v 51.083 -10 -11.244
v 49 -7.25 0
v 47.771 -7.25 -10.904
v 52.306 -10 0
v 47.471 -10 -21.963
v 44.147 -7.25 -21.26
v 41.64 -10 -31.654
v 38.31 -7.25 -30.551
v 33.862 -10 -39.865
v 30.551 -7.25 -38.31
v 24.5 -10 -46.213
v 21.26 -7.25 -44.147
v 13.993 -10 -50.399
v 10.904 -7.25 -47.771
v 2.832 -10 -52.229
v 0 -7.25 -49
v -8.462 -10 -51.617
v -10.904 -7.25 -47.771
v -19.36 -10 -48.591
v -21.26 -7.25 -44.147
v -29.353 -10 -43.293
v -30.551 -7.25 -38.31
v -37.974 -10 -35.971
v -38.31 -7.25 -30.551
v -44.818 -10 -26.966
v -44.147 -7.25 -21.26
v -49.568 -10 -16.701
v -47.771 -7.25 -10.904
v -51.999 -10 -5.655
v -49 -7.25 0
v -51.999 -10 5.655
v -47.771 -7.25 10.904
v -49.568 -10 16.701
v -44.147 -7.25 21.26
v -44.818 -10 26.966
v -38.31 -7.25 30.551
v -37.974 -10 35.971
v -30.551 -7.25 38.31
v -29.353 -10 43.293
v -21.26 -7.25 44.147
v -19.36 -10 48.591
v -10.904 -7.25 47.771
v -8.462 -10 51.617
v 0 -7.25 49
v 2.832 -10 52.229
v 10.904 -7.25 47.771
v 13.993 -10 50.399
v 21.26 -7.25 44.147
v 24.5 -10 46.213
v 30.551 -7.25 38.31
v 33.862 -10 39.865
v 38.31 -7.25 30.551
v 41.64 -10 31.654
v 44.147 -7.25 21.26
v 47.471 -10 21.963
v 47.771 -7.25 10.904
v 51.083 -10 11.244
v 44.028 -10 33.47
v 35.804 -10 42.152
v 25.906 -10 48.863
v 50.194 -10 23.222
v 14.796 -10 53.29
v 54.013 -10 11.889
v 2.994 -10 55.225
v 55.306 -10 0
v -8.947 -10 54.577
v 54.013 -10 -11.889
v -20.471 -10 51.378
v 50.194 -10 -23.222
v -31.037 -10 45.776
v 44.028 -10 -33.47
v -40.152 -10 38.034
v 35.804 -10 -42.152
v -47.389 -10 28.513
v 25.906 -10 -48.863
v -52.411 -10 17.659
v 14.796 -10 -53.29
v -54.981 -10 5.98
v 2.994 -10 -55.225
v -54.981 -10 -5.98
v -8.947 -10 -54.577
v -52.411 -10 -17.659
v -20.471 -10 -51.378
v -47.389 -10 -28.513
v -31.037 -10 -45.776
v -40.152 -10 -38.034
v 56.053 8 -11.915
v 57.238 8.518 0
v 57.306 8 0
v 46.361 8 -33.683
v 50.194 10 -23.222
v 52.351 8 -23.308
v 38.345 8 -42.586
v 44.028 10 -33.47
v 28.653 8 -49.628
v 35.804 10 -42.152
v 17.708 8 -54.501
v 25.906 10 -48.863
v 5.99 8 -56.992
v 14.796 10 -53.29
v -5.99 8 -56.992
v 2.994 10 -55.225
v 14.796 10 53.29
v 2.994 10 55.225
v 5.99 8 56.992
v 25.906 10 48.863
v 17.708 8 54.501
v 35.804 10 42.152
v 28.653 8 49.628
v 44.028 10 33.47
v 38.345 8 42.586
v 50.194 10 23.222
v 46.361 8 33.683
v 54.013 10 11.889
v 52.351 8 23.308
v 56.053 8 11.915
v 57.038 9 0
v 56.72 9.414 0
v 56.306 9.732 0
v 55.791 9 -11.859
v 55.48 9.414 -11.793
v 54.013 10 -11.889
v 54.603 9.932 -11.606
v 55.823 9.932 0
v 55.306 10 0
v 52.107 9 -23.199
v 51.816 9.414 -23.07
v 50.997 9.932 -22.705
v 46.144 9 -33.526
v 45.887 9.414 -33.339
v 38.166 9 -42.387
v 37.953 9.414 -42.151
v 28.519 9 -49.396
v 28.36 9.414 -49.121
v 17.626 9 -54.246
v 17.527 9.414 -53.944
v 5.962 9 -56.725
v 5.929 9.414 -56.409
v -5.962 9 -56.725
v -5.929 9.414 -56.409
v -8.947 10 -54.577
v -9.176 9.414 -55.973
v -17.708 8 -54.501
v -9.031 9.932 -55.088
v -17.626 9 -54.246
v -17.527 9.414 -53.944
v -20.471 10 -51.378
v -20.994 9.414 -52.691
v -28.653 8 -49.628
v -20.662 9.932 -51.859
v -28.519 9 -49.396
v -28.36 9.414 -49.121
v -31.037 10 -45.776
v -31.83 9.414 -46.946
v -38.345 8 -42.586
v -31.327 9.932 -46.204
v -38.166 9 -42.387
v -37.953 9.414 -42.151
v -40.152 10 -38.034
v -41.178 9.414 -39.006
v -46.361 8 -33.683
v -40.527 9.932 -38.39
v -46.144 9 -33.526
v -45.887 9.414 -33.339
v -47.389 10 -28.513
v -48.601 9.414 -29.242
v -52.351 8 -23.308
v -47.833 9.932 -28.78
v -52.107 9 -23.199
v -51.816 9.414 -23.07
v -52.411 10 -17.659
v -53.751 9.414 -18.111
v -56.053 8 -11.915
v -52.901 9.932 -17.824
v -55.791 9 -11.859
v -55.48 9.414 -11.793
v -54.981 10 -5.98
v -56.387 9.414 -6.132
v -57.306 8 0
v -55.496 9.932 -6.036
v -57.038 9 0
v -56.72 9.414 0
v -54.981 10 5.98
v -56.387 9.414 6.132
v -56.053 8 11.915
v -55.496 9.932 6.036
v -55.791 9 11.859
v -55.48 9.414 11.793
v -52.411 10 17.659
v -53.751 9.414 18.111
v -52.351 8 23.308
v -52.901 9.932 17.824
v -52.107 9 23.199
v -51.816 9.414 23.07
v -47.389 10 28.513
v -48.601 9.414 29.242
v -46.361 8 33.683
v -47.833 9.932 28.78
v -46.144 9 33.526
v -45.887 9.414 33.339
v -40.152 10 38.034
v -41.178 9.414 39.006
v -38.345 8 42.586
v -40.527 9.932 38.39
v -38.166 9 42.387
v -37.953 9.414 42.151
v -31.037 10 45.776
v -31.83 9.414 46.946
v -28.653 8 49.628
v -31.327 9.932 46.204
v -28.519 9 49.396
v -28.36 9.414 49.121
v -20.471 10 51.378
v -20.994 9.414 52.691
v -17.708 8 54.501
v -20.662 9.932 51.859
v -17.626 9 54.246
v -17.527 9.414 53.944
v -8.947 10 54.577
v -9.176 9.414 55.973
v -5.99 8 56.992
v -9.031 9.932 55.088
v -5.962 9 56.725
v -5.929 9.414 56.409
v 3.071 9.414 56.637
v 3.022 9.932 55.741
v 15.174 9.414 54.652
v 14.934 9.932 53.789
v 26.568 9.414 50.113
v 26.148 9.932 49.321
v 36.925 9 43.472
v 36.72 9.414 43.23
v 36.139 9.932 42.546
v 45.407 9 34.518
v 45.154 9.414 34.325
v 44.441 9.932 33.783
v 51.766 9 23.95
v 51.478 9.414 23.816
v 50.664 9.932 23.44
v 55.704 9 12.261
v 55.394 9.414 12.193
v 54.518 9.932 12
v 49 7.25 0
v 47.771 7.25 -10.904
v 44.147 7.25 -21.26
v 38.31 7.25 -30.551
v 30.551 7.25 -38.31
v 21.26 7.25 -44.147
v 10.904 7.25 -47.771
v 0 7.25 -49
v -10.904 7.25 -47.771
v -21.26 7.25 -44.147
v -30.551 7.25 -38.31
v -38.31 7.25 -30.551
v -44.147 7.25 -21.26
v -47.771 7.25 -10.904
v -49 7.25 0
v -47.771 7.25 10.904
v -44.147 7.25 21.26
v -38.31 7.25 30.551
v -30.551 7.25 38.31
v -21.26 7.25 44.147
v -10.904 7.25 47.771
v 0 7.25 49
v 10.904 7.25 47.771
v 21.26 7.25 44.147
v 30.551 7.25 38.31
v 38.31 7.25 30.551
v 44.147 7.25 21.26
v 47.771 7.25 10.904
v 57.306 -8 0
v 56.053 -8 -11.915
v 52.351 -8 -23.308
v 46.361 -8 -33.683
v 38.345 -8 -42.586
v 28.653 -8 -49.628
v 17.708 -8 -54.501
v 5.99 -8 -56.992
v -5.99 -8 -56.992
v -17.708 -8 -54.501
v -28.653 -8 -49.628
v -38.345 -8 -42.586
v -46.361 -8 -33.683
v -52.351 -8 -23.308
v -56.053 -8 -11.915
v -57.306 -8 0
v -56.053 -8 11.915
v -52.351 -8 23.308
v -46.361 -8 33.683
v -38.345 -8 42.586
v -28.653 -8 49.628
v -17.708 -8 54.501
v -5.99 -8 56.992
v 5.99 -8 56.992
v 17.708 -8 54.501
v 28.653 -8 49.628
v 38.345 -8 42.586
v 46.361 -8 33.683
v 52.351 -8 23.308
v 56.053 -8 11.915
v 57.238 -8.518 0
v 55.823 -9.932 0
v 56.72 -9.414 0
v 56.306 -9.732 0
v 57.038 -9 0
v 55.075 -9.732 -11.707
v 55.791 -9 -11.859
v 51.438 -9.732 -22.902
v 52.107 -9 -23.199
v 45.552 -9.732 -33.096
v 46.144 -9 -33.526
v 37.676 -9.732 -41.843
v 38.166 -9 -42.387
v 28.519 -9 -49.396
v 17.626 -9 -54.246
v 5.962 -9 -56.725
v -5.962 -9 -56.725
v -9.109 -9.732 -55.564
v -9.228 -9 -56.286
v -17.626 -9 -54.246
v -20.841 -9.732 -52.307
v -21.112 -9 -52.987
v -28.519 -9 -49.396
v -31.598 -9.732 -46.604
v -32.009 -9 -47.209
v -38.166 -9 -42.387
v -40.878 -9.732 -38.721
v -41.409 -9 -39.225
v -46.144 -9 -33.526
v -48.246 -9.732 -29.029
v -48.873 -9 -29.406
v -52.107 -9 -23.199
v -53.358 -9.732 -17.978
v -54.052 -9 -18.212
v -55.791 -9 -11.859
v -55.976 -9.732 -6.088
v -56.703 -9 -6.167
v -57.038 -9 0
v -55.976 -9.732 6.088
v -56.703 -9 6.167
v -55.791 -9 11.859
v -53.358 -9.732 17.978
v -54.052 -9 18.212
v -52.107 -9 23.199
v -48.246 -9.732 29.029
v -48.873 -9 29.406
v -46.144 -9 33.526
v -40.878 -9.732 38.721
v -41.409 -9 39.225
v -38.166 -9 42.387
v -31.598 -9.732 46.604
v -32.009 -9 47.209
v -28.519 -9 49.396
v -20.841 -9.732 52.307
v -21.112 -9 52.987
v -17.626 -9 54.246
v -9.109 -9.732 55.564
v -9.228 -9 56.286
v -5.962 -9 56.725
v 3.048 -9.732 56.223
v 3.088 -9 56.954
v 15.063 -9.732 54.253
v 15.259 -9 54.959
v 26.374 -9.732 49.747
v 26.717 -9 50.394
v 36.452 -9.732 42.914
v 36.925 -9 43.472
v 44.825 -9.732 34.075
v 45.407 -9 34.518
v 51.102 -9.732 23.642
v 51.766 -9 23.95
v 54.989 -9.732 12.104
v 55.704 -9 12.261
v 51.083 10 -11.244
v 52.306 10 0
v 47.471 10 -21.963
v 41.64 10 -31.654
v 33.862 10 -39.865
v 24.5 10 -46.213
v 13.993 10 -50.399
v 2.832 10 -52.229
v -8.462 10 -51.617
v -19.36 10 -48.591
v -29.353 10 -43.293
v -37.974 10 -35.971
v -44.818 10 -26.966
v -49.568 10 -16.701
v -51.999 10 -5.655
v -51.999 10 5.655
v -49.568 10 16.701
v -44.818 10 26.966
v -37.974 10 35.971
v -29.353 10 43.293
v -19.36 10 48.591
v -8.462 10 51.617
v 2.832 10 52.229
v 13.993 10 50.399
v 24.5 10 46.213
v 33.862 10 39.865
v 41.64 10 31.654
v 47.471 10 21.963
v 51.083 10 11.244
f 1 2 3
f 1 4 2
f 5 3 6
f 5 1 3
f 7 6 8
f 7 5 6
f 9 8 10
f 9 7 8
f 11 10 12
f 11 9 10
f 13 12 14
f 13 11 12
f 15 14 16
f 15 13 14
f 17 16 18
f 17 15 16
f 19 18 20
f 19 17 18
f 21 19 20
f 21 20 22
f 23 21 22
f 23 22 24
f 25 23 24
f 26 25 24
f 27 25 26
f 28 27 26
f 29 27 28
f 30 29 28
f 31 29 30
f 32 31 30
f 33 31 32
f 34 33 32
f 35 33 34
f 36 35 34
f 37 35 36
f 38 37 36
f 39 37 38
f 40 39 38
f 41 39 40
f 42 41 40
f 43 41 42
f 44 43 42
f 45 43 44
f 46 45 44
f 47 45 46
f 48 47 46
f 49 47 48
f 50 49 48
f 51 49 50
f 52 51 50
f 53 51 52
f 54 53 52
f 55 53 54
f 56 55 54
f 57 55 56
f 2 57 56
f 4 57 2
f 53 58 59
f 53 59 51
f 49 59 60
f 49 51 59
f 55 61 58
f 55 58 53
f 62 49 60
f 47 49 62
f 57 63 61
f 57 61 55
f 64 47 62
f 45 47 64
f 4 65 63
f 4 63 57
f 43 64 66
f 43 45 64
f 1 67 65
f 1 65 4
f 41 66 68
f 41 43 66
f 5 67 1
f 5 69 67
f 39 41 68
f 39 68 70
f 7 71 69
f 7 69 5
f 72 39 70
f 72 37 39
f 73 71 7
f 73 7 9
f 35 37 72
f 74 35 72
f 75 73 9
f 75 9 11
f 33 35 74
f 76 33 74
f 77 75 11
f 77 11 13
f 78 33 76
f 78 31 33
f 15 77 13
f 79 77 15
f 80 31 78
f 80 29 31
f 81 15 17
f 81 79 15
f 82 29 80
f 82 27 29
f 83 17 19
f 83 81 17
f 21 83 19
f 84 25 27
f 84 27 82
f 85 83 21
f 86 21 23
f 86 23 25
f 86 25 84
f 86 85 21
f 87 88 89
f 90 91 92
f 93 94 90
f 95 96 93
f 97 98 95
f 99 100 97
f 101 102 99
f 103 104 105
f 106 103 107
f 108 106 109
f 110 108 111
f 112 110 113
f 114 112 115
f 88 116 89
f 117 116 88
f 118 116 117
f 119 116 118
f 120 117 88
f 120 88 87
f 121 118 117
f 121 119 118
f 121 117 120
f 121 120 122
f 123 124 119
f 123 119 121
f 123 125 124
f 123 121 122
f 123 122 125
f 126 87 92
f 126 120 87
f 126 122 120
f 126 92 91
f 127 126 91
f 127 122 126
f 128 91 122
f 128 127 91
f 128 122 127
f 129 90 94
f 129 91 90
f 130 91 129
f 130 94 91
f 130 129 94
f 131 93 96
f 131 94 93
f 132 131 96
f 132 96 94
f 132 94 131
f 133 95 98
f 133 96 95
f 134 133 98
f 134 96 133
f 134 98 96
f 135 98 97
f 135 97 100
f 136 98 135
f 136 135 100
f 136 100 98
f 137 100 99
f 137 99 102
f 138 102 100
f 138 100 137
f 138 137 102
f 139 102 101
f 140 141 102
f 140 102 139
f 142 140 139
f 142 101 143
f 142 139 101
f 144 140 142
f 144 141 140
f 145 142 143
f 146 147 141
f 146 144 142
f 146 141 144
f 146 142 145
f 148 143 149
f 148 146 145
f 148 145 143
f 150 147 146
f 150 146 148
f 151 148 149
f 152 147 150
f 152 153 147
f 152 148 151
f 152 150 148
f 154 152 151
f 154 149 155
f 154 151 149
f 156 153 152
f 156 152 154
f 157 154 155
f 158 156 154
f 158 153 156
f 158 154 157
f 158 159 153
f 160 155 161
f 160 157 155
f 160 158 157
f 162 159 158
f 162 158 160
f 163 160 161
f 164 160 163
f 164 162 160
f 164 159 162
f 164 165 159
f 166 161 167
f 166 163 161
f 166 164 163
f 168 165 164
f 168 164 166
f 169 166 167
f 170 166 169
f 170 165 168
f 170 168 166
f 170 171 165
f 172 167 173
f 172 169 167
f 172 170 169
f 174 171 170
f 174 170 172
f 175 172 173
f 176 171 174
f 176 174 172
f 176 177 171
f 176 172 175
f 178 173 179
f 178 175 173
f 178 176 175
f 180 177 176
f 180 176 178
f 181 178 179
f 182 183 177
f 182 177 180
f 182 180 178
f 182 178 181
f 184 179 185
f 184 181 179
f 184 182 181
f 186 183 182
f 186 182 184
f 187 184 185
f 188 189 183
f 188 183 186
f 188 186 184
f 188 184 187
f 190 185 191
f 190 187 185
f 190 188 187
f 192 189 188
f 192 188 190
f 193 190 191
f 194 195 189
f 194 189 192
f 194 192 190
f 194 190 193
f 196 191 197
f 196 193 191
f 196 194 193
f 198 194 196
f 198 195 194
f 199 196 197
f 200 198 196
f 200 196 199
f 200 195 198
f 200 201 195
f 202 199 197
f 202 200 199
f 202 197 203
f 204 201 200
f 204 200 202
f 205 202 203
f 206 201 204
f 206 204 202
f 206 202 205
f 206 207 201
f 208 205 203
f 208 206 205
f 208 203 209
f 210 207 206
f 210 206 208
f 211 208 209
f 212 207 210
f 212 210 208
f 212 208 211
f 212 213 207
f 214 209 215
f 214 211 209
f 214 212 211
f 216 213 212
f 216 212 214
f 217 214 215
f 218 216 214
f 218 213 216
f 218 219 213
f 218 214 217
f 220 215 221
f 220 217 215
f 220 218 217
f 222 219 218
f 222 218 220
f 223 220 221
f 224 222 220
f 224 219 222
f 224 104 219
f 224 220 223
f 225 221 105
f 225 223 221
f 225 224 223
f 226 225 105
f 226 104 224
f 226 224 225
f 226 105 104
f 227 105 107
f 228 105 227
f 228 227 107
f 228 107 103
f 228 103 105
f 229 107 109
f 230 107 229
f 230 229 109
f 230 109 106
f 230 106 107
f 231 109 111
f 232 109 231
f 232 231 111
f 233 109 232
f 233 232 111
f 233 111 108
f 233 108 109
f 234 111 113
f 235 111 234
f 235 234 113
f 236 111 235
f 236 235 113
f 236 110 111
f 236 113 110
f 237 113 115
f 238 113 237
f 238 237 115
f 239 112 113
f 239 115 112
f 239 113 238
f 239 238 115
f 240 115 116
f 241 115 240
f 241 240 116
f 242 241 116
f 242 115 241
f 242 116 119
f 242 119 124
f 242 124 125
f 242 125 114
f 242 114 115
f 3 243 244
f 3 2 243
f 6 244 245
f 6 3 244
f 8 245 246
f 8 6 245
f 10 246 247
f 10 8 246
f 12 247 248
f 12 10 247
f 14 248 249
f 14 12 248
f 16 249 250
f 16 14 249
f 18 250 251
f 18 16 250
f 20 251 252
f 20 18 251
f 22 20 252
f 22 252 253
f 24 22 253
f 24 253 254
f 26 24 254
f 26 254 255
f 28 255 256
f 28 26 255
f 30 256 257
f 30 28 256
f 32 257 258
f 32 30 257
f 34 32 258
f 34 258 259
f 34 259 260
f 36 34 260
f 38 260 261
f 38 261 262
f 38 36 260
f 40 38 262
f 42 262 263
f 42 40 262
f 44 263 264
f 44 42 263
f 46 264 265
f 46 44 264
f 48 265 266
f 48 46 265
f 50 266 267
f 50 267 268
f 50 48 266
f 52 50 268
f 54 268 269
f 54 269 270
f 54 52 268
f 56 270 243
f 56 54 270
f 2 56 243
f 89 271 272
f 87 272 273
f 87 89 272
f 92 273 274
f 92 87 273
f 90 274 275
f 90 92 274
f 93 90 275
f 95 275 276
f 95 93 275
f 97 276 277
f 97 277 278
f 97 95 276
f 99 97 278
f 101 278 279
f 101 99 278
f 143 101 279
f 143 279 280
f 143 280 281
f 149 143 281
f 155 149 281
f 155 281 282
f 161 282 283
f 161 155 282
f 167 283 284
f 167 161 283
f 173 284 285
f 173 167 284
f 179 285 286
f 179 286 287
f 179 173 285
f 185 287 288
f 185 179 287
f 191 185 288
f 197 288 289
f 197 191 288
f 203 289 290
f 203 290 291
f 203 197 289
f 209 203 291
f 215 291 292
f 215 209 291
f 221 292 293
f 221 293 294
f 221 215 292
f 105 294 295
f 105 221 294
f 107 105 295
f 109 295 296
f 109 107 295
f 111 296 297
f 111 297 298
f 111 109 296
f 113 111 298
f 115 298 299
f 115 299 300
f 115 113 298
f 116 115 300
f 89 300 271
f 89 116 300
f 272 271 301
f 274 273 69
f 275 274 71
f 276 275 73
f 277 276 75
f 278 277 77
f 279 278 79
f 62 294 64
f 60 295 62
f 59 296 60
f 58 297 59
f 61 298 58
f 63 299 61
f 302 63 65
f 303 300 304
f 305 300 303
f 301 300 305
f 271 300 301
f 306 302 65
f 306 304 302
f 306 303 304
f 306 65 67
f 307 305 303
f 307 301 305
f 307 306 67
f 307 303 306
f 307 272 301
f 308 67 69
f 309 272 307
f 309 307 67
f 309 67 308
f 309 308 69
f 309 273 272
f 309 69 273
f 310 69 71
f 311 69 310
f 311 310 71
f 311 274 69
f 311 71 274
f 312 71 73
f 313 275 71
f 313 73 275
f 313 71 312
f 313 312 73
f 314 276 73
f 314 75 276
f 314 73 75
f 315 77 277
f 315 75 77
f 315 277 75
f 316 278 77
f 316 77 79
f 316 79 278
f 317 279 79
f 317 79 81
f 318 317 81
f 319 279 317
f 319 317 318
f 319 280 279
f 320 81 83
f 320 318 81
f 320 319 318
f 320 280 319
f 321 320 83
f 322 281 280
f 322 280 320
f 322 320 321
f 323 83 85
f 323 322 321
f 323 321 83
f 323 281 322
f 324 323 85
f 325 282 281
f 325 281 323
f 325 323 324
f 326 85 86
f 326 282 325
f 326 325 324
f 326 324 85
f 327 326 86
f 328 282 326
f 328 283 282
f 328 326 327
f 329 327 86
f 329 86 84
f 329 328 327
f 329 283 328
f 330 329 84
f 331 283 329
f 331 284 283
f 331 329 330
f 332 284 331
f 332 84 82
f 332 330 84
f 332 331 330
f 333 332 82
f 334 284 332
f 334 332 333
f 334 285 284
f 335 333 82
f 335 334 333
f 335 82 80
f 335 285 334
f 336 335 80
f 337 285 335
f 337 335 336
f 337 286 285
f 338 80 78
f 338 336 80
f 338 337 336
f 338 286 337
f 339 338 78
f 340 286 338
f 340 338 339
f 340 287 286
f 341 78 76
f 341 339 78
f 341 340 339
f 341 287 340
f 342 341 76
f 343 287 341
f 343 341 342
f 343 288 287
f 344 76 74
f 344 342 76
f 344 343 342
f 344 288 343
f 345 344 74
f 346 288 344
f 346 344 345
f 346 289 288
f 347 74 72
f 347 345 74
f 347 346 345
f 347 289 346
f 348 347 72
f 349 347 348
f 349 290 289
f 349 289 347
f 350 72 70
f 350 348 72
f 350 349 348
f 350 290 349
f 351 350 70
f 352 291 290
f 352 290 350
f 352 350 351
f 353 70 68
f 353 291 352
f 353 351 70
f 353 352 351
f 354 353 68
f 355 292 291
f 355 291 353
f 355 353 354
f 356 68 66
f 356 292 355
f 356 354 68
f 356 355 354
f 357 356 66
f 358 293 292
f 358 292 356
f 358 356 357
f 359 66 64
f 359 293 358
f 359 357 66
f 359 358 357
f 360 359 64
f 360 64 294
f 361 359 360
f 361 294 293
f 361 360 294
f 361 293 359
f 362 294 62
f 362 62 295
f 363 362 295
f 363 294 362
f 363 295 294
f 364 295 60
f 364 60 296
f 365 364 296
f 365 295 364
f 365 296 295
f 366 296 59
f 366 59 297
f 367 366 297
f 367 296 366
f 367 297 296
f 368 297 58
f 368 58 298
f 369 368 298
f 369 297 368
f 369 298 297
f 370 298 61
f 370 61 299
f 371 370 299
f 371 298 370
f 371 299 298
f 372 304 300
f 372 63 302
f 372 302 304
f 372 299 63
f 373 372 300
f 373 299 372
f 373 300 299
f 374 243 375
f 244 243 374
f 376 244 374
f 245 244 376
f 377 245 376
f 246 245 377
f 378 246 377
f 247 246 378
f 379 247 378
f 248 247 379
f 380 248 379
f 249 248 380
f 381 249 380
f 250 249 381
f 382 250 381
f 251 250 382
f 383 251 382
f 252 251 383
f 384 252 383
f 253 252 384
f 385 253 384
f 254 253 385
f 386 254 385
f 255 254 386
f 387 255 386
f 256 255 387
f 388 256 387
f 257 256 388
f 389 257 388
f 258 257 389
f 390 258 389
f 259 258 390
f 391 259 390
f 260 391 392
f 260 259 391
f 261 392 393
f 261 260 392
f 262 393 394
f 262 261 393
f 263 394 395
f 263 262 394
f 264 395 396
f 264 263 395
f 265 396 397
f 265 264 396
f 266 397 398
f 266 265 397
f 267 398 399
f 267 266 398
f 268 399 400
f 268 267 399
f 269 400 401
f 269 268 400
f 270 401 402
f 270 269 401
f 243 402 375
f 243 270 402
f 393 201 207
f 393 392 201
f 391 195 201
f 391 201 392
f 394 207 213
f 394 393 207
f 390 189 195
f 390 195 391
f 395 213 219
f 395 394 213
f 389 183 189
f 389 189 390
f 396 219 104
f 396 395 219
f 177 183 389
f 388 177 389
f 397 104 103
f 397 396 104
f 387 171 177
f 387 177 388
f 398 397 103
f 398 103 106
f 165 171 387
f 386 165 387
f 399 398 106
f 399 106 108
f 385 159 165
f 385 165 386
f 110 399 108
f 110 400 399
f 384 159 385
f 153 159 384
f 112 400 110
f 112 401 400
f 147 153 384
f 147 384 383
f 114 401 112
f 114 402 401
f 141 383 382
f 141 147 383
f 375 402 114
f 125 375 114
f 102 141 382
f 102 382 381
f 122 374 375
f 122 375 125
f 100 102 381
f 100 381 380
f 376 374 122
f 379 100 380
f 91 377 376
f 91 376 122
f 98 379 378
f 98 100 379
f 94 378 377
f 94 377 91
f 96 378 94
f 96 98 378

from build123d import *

# Parameters (mm, degrees)
F3_R = 2
F4_R = 2


with BuildPart() as f2:
    # F0 (on Top) → F2 (revolve)
    with BuildSketch(Plane.XY):
        Polygon((52.305677, 10), (49, 7.25), (49, -7.25), (52.305677, -10), (57.305677, -10), (57.305677, 10), align=None)
    revolve(axis=Axis((0, -6.822679, 0), (0, 1, 0)))

    # F3
    f3_edges = [f2.edges().sort_by_distance(p)[0] for p in [
        (-57.305677, -10, 0),
    ]]
    fillet(f3_edges, radius=F3_R)

    # F4
    f4_edges = [f2.edges().sort_by_distance(p)[0] for p in [
        (-57.305677, 10, 0),
    ]]
    fillet(f4_edges, radius=F4_R)


solid = f2.part
